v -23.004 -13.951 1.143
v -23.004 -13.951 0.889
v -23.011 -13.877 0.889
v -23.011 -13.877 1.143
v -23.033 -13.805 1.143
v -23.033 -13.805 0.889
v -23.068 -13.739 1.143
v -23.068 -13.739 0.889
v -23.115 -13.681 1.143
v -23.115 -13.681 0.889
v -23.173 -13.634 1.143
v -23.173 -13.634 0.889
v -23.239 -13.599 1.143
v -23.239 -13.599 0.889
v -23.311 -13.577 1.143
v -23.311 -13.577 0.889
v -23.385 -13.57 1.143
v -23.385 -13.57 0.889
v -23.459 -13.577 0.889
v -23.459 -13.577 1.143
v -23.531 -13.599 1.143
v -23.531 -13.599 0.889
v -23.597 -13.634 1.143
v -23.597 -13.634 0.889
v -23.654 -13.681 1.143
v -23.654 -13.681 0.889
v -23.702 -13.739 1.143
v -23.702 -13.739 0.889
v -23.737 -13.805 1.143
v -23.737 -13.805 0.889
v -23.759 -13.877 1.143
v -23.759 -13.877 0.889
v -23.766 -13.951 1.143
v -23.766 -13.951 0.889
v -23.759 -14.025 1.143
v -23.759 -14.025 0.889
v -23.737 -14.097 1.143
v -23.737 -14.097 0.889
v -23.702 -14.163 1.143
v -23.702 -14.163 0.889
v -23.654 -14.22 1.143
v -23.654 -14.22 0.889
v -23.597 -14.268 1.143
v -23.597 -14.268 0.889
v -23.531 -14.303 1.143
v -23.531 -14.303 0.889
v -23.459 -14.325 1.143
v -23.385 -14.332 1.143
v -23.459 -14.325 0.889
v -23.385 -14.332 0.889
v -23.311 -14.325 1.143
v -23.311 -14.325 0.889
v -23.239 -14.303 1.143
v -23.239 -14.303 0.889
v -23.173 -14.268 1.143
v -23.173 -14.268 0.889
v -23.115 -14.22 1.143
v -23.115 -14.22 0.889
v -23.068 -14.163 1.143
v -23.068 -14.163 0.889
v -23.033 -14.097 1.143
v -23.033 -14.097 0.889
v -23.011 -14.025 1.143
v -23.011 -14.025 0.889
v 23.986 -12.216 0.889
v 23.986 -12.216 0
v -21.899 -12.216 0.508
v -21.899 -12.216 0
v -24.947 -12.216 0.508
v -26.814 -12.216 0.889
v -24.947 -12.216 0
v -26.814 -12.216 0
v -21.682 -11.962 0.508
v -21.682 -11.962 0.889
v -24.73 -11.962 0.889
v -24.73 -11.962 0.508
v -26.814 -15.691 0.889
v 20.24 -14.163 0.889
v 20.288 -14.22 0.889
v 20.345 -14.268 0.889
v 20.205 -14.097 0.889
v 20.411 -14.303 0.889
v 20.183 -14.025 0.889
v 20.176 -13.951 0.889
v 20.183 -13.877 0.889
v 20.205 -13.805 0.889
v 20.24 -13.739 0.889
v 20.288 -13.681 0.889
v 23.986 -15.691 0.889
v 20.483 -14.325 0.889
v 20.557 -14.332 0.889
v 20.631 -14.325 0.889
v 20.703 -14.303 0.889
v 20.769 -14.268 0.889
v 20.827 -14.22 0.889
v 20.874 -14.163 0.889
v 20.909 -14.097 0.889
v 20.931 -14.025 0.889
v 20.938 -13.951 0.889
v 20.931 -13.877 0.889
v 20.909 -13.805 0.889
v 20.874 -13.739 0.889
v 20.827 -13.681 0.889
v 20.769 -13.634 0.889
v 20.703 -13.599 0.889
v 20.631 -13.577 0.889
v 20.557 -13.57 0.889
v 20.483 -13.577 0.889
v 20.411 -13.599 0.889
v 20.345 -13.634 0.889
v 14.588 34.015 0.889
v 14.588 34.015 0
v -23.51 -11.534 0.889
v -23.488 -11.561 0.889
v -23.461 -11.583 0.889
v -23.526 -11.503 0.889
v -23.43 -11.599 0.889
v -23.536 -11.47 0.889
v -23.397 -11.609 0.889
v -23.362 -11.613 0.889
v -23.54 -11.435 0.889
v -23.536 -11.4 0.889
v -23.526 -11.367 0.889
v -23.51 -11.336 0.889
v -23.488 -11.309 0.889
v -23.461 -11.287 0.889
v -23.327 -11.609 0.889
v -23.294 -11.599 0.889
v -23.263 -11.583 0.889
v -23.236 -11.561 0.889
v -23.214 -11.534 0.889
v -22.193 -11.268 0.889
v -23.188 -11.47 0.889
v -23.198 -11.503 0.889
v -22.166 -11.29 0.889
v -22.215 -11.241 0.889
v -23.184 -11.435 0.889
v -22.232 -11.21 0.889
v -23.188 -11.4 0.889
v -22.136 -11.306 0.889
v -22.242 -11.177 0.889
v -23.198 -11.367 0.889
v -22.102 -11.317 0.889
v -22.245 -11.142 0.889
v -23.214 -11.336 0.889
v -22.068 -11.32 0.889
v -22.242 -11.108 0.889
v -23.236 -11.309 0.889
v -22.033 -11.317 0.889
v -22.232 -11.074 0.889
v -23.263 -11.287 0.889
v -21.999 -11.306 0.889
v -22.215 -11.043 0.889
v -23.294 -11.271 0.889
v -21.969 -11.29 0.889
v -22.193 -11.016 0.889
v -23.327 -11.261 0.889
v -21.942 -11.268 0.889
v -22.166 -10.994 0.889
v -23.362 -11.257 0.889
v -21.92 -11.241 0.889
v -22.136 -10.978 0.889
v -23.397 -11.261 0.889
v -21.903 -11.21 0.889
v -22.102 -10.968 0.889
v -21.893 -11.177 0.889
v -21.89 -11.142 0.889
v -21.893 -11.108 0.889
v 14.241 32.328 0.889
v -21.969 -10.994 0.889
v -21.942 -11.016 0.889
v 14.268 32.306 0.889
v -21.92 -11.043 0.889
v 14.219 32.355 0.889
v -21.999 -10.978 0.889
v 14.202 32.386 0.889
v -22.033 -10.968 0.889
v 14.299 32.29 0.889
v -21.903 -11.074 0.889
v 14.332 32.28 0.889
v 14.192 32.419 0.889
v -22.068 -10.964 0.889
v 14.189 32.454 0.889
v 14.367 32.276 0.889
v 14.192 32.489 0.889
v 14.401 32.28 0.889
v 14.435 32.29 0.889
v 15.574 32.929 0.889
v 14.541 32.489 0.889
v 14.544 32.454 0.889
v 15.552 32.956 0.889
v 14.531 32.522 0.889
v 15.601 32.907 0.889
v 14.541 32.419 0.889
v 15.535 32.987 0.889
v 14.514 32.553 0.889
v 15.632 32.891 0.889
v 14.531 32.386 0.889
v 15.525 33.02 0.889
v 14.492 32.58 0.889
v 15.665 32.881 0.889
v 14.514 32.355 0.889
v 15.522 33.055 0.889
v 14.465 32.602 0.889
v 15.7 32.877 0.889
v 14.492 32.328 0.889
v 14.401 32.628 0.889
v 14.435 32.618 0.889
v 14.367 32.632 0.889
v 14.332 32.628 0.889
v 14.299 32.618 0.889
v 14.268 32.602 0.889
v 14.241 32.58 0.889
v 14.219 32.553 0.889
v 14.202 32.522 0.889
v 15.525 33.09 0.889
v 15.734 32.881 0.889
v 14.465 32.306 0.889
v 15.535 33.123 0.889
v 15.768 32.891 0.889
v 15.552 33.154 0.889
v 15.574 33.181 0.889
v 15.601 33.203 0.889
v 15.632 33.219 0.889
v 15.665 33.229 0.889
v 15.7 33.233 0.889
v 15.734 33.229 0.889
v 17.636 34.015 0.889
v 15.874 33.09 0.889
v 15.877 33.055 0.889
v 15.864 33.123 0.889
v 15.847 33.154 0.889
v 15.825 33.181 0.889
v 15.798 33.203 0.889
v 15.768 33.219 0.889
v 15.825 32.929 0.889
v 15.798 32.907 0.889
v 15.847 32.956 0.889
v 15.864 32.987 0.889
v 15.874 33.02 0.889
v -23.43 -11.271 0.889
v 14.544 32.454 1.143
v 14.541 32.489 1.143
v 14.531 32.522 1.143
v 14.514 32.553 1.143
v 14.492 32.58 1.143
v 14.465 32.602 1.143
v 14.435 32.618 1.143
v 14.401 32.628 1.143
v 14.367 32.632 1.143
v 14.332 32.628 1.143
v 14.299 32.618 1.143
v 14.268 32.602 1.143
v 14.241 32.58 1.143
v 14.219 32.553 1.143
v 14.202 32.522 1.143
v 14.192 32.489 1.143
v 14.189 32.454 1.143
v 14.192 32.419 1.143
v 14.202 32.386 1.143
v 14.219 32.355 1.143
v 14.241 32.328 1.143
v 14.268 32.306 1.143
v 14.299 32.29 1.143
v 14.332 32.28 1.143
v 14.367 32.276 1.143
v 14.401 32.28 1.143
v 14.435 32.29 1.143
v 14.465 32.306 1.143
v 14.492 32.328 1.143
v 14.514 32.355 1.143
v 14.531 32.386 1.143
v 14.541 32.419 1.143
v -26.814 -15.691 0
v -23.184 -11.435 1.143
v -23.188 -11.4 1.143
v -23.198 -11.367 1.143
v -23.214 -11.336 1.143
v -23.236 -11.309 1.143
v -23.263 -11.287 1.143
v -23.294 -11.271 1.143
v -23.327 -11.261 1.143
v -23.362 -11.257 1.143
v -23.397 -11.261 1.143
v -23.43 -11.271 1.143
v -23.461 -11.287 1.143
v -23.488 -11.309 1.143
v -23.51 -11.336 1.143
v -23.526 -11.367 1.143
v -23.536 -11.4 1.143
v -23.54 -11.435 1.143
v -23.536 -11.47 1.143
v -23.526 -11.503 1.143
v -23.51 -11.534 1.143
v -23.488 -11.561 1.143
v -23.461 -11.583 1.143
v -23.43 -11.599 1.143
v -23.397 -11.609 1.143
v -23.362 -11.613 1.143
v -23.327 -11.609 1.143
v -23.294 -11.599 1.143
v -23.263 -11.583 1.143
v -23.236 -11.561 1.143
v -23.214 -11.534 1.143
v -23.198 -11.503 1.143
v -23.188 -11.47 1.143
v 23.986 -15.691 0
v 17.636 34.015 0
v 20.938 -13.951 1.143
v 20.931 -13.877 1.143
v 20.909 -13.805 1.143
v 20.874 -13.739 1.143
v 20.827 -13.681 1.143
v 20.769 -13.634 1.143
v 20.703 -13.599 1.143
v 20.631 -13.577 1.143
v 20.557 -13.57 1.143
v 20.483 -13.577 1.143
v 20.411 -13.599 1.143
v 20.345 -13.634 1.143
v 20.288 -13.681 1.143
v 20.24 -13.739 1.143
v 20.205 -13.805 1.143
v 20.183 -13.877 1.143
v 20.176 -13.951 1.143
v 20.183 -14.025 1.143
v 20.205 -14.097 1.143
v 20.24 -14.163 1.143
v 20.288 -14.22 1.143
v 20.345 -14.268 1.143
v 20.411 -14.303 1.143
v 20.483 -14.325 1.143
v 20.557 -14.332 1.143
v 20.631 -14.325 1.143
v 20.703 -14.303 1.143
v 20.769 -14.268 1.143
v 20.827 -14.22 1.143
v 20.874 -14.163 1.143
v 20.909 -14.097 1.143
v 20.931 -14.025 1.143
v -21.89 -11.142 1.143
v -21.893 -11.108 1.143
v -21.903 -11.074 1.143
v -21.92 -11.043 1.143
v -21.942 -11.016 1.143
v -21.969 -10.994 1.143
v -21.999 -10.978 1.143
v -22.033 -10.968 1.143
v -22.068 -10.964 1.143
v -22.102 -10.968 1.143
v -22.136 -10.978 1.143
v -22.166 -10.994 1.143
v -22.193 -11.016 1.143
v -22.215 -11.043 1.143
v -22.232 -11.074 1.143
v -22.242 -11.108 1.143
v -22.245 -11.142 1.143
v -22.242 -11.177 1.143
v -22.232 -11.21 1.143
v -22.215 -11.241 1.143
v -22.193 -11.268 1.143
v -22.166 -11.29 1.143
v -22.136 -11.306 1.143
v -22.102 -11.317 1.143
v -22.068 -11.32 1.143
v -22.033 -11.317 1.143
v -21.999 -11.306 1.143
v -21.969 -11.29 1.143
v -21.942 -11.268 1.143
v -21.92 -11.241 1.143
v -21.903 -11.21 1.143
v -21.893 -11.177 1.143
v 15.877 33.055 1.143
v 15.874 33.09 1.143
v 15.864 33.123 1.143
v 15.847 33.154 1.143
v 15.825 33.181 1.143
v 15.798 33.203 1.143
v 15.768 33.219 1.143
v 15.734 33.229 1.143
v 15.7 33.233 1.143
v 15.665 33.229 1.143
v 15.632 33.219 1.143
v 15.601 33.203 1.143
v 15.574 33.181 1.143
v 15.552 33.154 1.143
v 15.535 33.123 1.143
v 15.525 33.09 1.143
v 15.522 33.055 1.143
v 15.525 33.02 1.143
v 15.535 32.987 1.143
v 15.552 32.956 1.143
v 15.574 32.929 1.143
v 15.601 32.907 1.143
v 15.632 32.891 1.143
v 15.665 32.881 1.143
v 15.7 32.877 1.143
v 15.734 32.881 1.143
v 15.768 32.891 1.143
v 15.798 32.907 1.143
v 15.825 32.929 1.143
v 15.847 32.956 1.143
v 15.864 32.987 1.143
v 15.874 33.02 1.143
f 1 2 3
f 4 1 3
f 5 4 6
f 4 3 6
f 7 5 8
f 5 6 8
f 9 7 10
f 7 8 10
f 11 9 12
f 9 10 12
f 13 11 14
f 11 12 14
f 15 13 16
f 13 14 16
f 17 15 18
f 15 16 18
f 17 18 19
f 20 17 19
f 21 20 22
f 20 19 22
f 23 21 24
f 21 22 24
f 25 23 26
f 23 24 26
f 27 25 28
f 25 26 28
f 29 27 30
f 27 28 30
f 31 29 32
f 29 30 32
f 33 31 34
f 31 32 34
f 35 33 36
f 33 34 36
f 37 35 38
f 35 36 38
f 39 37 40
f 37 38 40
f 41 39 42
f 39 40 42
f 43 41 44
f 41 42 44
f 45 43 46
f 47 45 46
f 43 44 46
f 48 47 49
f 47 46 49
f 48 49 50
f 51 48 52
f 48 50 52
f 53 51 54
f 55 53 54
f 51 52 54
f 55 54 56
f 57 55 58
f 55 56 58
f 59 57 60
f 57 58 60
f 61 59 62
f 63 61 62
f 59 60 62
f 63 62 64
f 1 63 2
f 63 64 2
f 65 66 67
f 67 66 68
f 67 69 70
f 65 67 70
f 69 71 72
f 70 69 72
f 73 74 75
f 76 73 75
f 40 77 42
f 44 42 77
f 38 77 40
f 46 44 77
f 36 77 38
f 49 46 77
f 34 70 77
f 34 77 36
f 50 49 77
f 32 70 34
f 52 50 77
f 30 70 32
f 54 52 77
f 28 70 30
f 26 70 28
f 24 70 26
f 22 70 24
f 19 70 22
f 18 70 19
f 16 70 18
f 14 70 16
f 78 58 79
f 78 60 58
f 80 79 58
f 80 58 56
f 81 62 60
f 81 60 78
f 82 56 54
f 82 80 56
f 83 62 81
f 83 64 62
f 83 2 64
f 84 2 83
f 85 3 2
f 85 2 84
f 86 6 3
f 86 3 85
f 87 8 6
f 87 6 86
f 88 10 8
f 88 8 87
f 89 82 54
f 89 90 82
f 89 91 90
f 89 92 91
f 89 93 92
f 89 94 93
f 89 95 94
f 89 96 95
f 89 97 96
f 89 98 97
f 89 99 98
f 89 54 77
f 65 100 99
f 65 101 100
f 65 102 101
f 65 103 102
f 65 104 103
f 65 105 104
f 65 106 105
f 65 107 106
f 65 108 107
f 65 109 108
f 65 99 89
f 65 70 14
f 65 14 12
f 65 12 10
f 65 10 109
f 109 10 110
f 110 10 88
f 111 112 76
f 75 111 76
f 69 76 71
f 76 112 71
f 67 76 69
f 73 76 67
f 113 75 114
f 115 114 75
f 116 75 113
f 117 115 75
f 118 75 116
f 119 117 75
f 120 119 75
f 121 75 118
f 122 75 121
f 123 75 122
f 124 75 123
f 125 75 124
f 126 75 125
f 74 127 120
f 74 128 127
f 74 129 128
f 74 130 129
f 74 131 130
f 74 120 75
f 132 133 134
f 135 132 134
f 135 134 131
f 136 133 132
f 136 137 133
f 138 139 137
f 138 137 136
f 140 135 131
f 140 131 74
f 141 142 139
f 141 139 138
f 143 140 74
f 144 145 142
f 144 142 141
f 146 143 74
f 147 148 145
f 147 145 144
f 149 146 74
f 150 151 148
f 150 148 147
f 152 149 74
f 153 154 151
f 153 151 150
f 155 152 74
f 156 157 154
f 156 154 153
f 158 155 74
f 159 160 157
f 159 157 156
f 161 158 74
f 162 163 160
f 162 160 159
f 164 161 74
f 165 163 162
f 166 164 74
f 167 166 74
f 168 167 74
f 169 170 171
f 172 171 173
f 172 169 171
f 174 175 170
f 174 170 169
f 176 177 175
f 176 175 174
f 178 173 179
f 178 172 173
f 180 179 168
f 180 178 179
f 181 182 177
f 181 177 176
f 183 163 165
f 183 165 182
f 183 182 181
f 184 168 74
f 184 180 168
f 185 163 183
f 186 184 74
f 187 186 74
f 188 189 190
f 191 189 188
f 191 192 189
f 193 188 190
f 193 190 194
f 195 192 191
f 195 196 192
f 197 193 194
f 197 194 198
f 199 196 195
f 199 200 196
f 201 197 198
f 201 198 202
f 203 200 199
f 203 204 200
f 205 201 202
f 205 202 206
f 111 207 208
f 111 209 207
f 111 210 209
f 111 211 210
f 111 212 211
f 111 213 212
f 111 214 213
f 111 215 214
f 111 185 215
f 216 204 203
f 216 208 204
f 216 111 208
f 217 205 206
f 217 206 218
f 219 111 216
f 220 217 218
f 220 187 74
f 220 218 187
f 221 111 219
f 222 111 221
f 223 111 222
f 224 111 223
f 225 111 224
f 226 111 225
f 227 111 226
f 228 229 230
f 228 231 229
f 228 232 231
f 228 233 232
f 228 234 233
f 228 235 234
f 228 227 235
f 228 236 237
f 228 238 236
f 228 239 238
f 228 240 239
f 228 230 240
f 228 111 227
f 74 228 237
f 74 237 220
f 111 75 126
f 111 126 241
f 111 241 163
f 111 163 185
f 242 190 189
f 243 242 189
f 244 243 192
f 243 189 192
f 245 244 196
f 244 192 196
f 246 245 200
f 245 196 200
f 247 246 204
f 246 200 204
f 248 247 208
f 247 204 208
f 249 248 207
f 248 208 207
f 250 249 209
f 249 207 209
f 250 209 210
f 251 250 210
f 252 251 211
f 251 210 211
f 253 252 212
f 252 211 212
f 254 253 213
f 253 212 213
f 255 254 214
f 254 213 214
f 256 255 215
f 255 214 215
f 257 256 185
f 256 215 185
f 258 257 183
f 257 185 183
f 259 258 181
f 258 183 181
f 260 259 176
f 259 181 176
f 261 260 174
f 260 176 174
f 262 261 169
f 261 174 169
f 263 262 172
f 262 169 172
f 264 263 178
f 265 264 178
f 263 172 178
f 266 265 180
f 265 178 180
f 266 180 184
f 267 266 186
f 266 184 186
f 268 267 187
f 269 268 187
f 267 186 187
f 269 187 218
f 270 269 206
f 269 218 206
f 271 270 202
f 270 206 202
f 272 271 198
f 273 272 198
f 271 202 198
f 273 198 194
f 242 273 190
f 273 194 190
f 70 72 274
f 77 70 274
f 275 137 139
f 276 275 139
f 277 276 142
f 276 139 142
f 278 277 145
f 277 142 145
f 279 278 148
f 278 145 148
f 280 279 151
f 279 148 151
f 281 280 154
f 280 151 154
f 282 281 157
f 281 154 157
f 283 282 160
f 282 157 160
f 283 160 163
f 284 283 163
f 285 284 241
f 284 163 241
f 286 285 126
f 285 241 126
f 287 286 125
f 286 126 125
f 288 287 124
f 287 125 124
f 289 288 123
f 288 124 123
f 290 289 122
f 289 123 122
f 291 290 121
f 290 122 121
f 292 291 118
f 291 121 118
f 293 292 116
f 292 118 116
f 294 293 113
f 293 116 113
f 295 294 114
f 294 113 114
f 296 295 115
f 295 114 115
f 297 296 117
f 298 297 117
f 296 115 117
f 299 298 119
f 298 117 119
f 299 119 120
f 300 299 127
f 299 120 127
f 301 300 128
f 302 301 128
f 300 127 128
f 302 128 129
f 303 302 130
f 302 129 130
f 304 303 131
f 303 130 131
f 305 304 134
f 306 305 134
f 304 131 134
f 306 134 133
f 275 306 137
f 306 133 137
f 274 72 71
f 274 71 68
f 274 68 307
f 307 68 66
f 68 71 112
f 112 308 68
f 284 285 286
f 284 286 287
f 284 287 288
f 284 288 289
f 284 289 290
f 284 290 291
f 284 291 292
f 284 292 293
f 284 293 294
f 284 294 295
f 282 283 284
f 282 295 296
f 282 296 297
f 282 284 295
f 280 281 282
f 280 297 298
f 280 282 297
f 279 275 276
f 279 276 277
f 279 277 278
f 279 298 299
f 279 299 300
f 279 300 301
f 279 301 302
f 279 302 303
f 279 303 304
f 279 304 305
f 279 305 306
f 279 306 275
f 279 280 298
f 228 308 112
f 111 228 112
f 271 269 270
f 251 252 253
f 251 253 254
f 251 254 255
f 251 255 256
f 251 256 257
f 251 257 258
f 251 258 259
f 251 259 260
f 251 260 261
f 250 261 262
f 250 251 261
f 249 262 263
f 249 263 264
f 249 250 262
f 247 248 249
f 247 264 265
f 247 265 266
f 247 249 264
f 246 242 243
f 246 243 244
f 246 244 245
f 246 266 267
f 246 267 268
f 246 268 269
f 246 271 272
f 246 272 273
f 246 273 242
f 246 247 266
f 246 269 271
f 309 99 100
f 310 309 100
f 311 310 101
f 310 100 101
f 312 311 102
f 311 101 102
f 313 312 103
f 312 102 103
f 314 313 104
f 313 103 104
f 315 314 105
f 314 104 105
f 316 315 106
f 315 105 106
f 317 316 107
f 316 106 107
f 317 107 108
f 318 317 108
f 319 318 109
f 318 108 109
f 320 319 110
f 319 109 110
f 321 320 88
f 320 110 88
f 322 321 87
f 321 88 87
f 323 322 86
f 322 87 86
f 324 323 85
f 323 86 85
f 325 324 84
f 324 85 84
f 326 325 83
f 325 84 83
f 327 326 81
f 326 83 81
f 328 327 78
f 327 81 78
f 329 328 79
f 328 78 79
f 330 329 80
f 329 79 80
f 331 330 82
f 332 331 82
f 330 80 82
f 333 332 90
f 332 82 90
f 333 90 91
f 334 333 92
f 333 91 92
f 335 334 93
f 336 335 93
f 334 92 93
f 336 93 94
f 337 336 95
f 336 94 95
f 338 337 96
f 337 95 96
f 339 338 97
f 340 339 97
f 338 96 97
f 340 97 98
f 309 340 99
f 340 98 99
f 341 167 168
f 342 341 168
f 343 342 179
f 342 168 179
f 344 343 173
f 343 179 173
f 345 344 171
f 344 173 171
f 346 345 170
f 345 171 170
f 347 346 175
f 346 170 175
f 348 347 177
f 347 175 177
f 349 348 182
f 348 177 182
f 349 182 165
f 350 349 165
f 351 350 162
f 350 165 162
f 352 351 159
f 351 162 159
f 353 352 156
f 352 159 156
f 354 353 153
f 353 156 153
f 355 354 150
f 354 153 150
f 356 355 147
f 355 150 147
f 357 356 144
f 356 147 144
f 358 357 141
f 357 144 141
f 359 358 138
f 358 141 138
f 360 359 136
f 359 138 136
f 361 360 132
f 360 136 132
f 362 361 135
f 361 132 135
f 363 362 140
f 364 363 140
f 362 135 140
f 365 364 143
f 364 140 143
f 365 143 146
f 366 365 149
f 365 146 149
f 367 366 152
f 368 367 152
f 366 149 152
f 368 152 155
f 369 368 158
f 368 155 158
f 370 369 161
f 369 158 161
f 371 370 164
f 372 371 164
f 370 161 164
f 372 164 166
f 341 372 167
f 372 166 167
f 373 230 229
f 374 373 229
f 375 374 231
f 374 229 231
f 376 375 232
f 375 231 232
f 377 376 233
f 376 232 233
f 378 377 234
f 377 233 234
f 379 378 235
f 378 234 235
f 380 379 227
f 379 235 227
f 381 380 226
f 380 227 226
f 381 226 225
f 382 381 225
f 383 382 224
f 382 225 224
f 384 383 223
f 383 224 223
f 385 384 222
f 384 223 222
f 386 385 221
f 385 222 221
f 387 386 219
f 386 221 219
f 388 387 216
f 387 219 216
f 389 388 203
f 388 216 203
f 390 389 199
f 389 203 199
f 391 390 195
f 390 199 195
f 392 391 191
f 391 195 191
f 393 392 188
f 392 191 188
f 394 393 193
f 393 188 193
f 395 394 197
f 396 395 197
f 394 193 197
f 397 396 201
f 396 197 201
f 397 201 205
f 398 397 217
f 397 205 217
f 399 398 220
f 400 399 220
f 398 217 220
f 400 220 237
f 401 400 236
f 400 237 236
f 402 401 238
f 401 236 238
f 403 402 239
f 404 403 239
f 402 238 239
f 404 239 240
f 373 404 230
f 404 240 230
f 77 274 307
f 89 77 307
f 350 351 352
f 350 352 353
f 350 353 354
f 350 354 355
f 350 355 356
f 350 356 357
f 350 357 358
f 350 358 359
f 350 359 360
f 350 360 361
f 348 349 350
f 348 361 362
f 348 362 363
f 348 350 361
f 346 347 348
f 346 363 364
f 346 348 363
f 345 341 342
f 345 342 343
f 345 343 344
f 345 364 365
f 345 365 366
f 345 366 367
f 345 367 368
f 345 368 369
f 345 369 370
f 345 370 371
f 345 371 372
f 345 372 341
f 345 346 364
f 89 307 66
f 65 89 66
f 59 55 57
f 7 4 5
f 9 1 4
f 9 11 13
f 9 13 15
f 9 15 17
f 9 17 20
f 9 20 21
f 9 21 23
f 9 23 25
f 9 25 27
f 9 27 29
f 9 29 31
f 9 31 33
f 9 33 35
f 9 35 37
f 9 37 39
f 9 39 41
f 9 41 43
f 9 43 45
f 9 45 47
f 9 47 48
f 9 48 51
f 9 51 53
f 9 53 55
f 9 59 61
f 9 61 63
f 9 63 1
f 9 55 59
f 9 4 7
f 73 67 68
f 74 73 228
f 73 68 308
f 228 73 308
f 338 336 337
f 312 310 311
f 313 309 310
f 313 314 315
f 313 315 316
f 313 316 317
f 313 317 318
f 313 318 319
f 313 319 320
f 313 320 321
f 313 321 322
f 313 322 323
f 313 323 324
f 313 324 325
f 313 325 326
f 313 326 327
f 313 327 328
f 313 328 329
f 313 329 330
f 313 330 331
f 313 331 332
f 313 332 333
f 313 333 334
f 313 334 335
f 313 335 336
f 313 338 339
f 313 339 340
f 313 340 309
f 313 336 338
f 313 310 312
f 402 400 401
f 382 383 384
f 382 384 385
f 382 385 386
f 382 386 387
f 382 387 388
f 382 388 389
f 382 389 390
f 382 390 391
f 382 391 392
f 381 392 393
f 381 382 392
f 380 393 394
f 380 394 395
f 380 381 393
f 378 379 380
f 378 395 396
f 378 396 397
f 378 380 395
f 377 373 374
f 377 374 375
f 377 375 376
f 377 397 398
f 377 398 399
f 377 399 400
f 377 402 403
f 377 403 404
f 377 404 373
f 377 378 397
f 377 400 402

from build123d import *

# Parameters (mm, degrees)
F1_DEPTH = 0.889
F3_DEPTH = 0.381
F4_R     = 0.1778
F4_R_2   = 0.381
F5_DEPTH = 0.254


with BuildPart() as f1:
    # F0 (on Top) → F1 (new body)
    with BuildSketch(Plane.XY):
        Polygon((-24.947381, -12.216053), (-26.81388, -12.216053), (-26.81388, -15.690773), (23.98612, -15.690773), (23.98612, -12.216053), (-21.899363, -12.216053), (17.63612, 34.014853), (14.588101, 34.014853), align=None)
    extrude(amount=F1_DEPTH)

    # F2 (on face) → F3 (cut)
    with BuildSketch(Plane.XY.offset(0.889)):
        Polygon((-24.730167, -11.962053), (-24.947381, -12.216053), (-21.899363, -12.216053), (-21.682148, -11.962053), align=None)
    extrude(amount=-F3_DEPTH, mode=Mode.SUBTRACT)

    # F4 (on face) → F5 (join)
    with BuildSketch(Plane.XY.offset(0.889)):
        with Locations((-23.361975, -11.435006)):
            Circle(F4_R)
        with Locations((-22.067515, -11.142211)):
            Circle(F4_R)
        with Locations((-23.38488, -13.950873)):
            Circle(F4_R_2)
        with Locations((15.699644, 33.05497)):
            Circle(F4_R)
        with Locations((14.366657, 32.453973)):
            Circle(F4_R)
        with Locations((20.55712, -13.950873)):
            Circle(F4_R_2)
    extrude(amount=F5_DEPTH)


solid = f1.part
